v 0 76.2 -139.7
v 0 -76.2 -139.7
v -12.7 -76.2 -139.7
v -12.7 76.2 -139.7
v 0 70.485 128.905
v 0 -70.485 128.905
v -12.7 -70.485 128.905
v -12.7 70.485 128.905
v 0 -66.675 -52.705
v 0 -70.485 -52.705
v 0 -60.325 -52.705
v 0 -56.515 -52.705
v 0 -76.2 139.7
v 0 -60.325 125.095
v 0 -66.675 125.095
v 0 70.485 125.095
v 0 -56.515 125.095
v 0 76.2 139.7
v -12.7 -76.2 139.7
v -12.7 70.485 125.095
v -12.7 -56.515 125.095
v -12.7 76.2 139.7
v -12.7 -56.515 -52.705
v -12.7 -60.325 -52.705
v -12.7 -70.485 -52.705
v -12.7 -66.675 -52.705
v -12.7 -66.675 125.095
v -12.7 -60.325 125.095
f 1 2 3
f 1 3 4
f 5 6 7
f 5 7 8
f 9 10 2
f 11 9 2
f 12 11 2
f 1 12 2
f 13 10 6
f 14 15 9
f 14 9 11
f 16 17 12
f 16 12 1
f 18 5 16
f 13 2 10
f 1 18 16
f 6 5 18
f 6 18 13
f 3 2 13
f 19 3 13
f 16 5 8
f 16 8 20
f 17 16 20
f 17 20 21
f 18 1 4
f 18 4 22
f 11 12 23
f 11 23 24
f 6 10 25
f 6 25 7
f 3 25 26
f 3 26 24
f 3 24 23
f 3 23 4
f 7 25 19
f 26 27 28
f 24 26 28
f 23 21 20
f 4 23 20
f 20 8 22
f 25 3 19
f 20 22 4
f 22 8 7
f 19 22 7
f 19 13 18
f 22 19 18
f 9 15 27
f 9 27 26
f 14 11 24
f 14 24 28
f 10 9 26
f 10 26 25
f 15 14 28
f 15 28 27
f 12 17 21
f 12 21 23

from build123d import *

# Parameters (mm, degrees)
F0_W     = 152.4
F0_H     = 279.4
F1_DEPTH = 12.7


with BuildPart() as f1:
    # F0 (on Right) → F1 (new body)
    with BuildSketch(Plane.YZ):
        Rectangle(F0_W, F0_H)
        Polygon((-66.675, -52.705), (-70.485, -52.705), (-70.485, 125.095), (-70.485, 128.905), (-66.675, 128.905), (-60.325, 128.905), (-56.515, 128.905), (70.485, 128.905), (70.485, 125.095), (-56.515, 125.095), (-56.515, 112.395), (-56.515, -52.705), (-60.325, -52.705), (-60.325, -40.005), (-60.325, 112.395), (-60.325, 125.095), (-66.675, 125.095), align=None, mode=Mode.SUBTRACT)
    extrude(amount=-F1_DEPTH)


solid = f1.part
